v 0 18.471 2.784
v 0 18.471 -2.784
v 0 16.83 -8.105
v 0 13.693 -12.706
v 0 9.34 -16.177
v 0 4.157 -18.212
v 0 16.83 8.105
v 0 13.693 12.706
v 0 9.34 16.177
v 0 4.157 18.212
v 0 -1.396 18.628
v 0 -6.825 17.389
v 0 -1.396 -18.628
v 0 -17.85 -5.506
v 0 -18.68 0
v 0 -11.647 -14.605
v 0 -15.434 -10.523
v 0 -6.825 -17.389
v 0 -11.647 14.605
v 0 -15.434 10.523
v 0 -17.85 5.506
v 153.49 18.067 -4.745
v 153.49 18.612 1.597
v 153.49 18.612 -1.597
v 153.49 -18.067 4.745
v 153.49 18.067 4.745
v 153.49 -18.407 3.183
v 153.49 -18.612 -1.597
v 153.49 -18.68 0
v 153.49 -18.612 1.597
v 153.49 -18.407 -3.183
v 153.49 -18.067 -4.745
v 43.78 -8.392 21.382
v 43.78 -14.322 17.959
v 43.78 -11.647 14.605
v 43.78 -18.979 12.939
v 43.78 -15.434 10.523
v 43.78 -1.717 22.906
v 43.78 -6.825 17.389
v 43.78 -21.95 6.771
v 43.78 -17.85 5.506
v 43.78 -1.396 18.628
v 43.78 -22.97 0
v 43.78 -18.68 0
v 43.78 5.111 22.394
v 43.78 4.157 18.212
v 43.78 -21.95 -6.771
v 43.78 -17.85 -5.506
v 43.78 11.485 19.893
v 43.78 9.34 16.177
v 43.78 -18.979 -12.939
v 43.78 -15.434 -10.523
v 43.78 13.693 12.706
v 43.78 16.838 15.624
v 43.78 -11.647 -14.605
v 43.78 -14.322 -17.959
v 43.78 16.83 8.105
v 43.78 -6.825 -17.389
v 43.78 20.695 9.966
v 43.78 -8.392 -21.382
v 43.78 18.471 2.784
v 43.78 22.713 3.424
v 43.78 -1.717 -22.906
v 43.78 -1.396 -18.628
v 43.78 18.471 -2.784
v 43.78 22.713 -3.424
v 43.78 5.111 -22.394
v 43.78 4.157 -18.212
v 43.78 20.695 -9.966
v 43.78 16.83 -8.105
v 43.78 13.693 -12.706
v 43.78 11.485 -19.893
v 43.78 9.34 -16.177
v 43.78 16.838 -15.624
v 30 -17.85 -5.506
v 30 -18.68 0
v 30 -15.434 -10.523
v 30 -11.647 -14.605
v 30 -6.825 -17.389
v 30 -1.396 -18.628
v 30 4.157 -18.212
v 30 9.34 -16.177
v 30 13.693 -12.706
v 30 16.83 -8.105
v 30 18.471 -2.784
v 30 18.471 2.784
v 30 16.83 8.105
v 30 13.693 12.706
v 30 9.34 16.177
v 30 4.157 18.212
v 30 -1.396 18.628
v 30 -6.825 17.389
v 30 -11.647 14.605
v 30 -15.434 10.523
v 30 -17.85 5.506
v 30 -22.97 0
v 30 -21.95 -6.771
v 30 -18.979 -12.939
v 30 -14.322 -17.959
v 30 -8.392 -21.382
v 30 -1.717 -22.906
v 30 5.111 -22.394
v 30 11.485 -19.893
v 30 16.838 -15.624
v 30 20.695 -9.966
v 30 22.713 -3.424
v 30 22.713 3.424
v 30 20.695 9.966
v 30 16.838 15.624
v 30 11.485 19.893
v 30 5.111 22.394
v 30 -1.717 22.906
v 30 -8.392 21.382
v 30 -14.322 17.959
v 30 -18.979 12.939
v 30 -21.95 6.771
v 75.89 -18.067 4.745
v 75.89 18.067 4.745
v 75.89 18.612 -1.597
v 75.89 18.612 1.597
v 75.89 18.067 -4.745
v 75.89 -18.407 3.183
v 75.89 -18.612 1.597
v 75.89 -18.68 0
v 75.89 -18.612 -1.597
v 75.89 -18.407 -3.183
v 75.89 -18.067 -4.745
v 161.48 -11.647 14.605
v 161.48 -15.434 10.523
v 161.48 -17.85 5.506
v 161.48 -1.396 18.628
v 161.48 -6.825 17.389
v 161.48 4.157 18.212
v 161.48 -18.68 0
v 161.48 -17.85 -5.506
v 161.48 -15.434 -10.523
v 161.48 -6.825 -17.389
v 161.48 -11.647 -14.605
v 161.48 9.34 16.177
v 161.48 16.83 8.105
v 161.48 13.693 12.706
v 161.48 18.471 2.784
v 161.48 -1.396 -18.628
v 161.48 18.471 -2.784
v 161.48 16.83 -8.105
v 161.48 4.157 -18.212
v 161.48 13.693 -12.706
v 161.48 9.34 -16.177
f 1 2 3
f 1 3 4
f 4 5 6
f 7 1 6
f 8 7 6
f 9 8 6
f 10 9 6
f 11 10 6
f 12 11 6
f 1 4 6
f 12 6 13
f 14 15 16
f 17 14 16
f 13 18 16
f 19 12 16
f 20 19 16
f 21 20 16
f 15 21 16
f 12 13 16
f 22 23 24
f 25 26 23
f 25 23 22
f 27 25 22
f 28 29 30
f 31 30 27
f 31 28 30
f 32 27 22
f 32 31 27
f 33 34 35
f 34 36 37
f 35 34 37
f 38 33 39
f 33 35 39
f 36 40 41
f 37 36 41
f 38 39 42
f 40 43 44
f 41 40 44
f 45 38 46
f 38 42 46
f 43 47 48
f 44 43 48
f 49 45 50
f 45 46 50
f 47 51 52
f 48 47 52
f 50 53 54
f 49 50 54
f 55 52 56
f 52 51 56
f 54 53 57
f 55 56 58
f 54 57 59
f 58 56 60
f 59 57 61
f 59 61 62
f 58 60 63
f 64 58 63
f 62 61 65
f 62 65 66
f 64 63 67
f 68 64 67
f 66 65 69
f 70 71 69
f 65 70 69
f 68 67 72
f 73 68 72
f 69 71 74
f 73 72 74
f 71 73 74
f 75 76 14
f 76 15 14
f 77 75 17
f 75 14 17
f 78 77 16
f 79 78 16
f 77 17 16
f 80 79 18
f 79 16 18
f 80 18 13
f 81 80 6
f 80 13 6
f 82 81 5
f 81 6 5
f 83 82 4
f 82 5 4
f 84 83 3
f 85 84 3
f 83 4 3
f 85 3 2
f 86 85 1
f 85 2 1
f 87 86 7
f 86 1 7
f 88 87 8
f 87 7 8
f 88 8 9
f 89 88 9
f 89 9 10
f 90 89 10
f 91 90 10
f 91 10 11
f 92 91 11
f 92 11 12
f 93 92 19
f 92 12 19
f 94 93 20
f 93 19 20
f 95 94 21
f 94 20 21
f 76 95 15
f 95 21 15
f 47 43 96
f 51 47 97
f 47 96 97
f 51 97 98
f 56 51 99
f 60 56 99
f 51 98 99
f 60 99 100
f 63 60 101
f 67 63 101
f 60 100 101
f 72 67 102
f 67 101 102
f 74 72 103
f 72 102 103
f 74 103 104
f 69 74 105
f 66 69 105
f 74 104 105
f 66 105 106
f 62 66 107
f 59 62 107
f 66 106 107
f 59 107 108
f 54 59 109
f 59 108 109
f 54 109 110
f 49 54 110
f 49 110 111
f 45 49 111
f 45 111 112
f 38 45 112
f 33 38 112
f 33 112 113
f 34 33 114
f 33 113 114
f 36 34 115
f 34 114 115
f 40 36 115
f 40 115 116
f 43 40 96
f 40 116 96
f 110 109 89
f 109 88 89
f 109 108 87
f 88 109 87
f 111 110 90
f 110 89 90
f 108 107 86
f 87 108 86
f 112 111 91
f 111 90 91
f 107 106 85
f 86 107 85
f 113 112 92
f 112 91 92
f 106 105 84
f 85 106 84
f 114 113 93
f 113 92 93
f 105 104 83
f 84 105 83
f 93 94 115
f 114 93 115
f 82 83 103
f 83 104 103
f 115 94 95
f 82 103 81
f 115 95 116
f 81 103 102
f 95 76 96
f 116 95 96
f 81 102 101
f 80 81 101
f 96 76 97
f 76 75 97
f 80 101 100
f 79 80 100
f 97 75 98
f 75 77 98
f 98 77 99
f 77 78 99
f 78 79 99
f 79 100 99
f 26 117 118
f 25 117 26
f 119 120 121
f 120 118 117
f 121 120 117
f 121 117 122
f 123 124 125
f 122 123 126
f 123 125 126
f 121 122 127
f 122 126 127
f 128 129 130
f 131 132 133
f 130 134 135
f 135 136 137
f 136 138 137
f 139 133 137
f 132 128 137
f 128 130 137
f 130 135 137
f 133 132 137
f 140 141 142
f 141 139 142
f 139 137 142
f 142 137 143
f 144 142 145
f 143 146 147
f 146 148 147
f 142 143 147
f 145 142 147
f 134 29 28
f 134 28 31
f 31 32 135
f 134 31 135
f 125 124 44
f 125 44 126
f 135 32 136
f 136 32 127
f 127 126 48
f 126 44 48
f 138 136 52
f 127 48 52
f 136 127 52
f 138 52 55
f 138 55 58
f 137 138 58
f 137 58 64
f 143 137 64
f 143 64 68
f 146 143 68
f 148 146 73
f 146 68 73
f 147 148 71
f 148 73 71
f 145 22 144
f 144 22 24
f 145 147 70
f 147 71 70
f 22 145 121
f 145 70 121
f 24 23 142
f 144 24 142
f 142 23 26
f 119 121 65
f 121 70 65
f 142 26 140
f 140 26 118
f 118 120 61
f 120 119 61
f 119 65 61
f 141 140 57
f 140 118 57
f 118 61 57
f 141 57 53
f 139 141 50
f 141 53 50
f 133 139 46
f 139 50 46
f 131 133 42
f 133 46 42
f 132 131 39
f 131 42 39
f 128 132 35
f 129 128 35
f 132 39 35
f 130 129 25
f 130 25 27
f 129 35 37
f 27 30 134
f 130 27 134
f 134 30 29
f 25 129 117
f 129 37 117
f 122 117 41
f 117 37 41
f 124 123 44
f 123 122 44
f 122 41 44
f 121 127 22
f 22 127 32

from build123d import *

# Parameters (mm, degrees)
CUT_EXTRUDE2_DEPTH      = 165.71500296
CUT_EXTRUDE2_DEPTH_BACK = 165.71500296
SKETCH3_W               = 77.6
SKETCH3_H               = 9.49


with BuildPart() as part:
    # Sketch1 → Revolve1 (revolve)
    with BuildSketch(Plane.XY, mode=Mode.PRIVATE) as revolve1_sk:
        Polygon((161.48, 0), (161.48, 18.68), (43.78, 18.68), (43.78, 22.97), (30, 22.97), (30, 18.68), (0, 18.68), (0, 0), align=None)
    revolve(revolve1_sk.sketch.rotate(Axis((0, 0, 0), (1, 0, 0)), 180), axis=Axis((0, 0, 0), (1, 0, 0)))

    # Sketch3 → Cut-Extrude2 (cut, two sides: drawn at the far end of the back side and taken through both)
    with BuildSketch(Plane(origin=(0, 0, 0), x_dir=(1, 0, 0), z_dir=(0, 1, 0)).offset(-CUT_EXTRUDE2_DEPTH_BACK)):
        with Locations((114.69, 0)):
            Rectangle(SKETCH3_W, SKETCH3_H)
    extrude(amount=CUT_EXTRUDE2_DEPTH + CUT_EXTRUDE2_DEPTH_BACK, mode=Mode.SUBTRACT)


solid = part.part
